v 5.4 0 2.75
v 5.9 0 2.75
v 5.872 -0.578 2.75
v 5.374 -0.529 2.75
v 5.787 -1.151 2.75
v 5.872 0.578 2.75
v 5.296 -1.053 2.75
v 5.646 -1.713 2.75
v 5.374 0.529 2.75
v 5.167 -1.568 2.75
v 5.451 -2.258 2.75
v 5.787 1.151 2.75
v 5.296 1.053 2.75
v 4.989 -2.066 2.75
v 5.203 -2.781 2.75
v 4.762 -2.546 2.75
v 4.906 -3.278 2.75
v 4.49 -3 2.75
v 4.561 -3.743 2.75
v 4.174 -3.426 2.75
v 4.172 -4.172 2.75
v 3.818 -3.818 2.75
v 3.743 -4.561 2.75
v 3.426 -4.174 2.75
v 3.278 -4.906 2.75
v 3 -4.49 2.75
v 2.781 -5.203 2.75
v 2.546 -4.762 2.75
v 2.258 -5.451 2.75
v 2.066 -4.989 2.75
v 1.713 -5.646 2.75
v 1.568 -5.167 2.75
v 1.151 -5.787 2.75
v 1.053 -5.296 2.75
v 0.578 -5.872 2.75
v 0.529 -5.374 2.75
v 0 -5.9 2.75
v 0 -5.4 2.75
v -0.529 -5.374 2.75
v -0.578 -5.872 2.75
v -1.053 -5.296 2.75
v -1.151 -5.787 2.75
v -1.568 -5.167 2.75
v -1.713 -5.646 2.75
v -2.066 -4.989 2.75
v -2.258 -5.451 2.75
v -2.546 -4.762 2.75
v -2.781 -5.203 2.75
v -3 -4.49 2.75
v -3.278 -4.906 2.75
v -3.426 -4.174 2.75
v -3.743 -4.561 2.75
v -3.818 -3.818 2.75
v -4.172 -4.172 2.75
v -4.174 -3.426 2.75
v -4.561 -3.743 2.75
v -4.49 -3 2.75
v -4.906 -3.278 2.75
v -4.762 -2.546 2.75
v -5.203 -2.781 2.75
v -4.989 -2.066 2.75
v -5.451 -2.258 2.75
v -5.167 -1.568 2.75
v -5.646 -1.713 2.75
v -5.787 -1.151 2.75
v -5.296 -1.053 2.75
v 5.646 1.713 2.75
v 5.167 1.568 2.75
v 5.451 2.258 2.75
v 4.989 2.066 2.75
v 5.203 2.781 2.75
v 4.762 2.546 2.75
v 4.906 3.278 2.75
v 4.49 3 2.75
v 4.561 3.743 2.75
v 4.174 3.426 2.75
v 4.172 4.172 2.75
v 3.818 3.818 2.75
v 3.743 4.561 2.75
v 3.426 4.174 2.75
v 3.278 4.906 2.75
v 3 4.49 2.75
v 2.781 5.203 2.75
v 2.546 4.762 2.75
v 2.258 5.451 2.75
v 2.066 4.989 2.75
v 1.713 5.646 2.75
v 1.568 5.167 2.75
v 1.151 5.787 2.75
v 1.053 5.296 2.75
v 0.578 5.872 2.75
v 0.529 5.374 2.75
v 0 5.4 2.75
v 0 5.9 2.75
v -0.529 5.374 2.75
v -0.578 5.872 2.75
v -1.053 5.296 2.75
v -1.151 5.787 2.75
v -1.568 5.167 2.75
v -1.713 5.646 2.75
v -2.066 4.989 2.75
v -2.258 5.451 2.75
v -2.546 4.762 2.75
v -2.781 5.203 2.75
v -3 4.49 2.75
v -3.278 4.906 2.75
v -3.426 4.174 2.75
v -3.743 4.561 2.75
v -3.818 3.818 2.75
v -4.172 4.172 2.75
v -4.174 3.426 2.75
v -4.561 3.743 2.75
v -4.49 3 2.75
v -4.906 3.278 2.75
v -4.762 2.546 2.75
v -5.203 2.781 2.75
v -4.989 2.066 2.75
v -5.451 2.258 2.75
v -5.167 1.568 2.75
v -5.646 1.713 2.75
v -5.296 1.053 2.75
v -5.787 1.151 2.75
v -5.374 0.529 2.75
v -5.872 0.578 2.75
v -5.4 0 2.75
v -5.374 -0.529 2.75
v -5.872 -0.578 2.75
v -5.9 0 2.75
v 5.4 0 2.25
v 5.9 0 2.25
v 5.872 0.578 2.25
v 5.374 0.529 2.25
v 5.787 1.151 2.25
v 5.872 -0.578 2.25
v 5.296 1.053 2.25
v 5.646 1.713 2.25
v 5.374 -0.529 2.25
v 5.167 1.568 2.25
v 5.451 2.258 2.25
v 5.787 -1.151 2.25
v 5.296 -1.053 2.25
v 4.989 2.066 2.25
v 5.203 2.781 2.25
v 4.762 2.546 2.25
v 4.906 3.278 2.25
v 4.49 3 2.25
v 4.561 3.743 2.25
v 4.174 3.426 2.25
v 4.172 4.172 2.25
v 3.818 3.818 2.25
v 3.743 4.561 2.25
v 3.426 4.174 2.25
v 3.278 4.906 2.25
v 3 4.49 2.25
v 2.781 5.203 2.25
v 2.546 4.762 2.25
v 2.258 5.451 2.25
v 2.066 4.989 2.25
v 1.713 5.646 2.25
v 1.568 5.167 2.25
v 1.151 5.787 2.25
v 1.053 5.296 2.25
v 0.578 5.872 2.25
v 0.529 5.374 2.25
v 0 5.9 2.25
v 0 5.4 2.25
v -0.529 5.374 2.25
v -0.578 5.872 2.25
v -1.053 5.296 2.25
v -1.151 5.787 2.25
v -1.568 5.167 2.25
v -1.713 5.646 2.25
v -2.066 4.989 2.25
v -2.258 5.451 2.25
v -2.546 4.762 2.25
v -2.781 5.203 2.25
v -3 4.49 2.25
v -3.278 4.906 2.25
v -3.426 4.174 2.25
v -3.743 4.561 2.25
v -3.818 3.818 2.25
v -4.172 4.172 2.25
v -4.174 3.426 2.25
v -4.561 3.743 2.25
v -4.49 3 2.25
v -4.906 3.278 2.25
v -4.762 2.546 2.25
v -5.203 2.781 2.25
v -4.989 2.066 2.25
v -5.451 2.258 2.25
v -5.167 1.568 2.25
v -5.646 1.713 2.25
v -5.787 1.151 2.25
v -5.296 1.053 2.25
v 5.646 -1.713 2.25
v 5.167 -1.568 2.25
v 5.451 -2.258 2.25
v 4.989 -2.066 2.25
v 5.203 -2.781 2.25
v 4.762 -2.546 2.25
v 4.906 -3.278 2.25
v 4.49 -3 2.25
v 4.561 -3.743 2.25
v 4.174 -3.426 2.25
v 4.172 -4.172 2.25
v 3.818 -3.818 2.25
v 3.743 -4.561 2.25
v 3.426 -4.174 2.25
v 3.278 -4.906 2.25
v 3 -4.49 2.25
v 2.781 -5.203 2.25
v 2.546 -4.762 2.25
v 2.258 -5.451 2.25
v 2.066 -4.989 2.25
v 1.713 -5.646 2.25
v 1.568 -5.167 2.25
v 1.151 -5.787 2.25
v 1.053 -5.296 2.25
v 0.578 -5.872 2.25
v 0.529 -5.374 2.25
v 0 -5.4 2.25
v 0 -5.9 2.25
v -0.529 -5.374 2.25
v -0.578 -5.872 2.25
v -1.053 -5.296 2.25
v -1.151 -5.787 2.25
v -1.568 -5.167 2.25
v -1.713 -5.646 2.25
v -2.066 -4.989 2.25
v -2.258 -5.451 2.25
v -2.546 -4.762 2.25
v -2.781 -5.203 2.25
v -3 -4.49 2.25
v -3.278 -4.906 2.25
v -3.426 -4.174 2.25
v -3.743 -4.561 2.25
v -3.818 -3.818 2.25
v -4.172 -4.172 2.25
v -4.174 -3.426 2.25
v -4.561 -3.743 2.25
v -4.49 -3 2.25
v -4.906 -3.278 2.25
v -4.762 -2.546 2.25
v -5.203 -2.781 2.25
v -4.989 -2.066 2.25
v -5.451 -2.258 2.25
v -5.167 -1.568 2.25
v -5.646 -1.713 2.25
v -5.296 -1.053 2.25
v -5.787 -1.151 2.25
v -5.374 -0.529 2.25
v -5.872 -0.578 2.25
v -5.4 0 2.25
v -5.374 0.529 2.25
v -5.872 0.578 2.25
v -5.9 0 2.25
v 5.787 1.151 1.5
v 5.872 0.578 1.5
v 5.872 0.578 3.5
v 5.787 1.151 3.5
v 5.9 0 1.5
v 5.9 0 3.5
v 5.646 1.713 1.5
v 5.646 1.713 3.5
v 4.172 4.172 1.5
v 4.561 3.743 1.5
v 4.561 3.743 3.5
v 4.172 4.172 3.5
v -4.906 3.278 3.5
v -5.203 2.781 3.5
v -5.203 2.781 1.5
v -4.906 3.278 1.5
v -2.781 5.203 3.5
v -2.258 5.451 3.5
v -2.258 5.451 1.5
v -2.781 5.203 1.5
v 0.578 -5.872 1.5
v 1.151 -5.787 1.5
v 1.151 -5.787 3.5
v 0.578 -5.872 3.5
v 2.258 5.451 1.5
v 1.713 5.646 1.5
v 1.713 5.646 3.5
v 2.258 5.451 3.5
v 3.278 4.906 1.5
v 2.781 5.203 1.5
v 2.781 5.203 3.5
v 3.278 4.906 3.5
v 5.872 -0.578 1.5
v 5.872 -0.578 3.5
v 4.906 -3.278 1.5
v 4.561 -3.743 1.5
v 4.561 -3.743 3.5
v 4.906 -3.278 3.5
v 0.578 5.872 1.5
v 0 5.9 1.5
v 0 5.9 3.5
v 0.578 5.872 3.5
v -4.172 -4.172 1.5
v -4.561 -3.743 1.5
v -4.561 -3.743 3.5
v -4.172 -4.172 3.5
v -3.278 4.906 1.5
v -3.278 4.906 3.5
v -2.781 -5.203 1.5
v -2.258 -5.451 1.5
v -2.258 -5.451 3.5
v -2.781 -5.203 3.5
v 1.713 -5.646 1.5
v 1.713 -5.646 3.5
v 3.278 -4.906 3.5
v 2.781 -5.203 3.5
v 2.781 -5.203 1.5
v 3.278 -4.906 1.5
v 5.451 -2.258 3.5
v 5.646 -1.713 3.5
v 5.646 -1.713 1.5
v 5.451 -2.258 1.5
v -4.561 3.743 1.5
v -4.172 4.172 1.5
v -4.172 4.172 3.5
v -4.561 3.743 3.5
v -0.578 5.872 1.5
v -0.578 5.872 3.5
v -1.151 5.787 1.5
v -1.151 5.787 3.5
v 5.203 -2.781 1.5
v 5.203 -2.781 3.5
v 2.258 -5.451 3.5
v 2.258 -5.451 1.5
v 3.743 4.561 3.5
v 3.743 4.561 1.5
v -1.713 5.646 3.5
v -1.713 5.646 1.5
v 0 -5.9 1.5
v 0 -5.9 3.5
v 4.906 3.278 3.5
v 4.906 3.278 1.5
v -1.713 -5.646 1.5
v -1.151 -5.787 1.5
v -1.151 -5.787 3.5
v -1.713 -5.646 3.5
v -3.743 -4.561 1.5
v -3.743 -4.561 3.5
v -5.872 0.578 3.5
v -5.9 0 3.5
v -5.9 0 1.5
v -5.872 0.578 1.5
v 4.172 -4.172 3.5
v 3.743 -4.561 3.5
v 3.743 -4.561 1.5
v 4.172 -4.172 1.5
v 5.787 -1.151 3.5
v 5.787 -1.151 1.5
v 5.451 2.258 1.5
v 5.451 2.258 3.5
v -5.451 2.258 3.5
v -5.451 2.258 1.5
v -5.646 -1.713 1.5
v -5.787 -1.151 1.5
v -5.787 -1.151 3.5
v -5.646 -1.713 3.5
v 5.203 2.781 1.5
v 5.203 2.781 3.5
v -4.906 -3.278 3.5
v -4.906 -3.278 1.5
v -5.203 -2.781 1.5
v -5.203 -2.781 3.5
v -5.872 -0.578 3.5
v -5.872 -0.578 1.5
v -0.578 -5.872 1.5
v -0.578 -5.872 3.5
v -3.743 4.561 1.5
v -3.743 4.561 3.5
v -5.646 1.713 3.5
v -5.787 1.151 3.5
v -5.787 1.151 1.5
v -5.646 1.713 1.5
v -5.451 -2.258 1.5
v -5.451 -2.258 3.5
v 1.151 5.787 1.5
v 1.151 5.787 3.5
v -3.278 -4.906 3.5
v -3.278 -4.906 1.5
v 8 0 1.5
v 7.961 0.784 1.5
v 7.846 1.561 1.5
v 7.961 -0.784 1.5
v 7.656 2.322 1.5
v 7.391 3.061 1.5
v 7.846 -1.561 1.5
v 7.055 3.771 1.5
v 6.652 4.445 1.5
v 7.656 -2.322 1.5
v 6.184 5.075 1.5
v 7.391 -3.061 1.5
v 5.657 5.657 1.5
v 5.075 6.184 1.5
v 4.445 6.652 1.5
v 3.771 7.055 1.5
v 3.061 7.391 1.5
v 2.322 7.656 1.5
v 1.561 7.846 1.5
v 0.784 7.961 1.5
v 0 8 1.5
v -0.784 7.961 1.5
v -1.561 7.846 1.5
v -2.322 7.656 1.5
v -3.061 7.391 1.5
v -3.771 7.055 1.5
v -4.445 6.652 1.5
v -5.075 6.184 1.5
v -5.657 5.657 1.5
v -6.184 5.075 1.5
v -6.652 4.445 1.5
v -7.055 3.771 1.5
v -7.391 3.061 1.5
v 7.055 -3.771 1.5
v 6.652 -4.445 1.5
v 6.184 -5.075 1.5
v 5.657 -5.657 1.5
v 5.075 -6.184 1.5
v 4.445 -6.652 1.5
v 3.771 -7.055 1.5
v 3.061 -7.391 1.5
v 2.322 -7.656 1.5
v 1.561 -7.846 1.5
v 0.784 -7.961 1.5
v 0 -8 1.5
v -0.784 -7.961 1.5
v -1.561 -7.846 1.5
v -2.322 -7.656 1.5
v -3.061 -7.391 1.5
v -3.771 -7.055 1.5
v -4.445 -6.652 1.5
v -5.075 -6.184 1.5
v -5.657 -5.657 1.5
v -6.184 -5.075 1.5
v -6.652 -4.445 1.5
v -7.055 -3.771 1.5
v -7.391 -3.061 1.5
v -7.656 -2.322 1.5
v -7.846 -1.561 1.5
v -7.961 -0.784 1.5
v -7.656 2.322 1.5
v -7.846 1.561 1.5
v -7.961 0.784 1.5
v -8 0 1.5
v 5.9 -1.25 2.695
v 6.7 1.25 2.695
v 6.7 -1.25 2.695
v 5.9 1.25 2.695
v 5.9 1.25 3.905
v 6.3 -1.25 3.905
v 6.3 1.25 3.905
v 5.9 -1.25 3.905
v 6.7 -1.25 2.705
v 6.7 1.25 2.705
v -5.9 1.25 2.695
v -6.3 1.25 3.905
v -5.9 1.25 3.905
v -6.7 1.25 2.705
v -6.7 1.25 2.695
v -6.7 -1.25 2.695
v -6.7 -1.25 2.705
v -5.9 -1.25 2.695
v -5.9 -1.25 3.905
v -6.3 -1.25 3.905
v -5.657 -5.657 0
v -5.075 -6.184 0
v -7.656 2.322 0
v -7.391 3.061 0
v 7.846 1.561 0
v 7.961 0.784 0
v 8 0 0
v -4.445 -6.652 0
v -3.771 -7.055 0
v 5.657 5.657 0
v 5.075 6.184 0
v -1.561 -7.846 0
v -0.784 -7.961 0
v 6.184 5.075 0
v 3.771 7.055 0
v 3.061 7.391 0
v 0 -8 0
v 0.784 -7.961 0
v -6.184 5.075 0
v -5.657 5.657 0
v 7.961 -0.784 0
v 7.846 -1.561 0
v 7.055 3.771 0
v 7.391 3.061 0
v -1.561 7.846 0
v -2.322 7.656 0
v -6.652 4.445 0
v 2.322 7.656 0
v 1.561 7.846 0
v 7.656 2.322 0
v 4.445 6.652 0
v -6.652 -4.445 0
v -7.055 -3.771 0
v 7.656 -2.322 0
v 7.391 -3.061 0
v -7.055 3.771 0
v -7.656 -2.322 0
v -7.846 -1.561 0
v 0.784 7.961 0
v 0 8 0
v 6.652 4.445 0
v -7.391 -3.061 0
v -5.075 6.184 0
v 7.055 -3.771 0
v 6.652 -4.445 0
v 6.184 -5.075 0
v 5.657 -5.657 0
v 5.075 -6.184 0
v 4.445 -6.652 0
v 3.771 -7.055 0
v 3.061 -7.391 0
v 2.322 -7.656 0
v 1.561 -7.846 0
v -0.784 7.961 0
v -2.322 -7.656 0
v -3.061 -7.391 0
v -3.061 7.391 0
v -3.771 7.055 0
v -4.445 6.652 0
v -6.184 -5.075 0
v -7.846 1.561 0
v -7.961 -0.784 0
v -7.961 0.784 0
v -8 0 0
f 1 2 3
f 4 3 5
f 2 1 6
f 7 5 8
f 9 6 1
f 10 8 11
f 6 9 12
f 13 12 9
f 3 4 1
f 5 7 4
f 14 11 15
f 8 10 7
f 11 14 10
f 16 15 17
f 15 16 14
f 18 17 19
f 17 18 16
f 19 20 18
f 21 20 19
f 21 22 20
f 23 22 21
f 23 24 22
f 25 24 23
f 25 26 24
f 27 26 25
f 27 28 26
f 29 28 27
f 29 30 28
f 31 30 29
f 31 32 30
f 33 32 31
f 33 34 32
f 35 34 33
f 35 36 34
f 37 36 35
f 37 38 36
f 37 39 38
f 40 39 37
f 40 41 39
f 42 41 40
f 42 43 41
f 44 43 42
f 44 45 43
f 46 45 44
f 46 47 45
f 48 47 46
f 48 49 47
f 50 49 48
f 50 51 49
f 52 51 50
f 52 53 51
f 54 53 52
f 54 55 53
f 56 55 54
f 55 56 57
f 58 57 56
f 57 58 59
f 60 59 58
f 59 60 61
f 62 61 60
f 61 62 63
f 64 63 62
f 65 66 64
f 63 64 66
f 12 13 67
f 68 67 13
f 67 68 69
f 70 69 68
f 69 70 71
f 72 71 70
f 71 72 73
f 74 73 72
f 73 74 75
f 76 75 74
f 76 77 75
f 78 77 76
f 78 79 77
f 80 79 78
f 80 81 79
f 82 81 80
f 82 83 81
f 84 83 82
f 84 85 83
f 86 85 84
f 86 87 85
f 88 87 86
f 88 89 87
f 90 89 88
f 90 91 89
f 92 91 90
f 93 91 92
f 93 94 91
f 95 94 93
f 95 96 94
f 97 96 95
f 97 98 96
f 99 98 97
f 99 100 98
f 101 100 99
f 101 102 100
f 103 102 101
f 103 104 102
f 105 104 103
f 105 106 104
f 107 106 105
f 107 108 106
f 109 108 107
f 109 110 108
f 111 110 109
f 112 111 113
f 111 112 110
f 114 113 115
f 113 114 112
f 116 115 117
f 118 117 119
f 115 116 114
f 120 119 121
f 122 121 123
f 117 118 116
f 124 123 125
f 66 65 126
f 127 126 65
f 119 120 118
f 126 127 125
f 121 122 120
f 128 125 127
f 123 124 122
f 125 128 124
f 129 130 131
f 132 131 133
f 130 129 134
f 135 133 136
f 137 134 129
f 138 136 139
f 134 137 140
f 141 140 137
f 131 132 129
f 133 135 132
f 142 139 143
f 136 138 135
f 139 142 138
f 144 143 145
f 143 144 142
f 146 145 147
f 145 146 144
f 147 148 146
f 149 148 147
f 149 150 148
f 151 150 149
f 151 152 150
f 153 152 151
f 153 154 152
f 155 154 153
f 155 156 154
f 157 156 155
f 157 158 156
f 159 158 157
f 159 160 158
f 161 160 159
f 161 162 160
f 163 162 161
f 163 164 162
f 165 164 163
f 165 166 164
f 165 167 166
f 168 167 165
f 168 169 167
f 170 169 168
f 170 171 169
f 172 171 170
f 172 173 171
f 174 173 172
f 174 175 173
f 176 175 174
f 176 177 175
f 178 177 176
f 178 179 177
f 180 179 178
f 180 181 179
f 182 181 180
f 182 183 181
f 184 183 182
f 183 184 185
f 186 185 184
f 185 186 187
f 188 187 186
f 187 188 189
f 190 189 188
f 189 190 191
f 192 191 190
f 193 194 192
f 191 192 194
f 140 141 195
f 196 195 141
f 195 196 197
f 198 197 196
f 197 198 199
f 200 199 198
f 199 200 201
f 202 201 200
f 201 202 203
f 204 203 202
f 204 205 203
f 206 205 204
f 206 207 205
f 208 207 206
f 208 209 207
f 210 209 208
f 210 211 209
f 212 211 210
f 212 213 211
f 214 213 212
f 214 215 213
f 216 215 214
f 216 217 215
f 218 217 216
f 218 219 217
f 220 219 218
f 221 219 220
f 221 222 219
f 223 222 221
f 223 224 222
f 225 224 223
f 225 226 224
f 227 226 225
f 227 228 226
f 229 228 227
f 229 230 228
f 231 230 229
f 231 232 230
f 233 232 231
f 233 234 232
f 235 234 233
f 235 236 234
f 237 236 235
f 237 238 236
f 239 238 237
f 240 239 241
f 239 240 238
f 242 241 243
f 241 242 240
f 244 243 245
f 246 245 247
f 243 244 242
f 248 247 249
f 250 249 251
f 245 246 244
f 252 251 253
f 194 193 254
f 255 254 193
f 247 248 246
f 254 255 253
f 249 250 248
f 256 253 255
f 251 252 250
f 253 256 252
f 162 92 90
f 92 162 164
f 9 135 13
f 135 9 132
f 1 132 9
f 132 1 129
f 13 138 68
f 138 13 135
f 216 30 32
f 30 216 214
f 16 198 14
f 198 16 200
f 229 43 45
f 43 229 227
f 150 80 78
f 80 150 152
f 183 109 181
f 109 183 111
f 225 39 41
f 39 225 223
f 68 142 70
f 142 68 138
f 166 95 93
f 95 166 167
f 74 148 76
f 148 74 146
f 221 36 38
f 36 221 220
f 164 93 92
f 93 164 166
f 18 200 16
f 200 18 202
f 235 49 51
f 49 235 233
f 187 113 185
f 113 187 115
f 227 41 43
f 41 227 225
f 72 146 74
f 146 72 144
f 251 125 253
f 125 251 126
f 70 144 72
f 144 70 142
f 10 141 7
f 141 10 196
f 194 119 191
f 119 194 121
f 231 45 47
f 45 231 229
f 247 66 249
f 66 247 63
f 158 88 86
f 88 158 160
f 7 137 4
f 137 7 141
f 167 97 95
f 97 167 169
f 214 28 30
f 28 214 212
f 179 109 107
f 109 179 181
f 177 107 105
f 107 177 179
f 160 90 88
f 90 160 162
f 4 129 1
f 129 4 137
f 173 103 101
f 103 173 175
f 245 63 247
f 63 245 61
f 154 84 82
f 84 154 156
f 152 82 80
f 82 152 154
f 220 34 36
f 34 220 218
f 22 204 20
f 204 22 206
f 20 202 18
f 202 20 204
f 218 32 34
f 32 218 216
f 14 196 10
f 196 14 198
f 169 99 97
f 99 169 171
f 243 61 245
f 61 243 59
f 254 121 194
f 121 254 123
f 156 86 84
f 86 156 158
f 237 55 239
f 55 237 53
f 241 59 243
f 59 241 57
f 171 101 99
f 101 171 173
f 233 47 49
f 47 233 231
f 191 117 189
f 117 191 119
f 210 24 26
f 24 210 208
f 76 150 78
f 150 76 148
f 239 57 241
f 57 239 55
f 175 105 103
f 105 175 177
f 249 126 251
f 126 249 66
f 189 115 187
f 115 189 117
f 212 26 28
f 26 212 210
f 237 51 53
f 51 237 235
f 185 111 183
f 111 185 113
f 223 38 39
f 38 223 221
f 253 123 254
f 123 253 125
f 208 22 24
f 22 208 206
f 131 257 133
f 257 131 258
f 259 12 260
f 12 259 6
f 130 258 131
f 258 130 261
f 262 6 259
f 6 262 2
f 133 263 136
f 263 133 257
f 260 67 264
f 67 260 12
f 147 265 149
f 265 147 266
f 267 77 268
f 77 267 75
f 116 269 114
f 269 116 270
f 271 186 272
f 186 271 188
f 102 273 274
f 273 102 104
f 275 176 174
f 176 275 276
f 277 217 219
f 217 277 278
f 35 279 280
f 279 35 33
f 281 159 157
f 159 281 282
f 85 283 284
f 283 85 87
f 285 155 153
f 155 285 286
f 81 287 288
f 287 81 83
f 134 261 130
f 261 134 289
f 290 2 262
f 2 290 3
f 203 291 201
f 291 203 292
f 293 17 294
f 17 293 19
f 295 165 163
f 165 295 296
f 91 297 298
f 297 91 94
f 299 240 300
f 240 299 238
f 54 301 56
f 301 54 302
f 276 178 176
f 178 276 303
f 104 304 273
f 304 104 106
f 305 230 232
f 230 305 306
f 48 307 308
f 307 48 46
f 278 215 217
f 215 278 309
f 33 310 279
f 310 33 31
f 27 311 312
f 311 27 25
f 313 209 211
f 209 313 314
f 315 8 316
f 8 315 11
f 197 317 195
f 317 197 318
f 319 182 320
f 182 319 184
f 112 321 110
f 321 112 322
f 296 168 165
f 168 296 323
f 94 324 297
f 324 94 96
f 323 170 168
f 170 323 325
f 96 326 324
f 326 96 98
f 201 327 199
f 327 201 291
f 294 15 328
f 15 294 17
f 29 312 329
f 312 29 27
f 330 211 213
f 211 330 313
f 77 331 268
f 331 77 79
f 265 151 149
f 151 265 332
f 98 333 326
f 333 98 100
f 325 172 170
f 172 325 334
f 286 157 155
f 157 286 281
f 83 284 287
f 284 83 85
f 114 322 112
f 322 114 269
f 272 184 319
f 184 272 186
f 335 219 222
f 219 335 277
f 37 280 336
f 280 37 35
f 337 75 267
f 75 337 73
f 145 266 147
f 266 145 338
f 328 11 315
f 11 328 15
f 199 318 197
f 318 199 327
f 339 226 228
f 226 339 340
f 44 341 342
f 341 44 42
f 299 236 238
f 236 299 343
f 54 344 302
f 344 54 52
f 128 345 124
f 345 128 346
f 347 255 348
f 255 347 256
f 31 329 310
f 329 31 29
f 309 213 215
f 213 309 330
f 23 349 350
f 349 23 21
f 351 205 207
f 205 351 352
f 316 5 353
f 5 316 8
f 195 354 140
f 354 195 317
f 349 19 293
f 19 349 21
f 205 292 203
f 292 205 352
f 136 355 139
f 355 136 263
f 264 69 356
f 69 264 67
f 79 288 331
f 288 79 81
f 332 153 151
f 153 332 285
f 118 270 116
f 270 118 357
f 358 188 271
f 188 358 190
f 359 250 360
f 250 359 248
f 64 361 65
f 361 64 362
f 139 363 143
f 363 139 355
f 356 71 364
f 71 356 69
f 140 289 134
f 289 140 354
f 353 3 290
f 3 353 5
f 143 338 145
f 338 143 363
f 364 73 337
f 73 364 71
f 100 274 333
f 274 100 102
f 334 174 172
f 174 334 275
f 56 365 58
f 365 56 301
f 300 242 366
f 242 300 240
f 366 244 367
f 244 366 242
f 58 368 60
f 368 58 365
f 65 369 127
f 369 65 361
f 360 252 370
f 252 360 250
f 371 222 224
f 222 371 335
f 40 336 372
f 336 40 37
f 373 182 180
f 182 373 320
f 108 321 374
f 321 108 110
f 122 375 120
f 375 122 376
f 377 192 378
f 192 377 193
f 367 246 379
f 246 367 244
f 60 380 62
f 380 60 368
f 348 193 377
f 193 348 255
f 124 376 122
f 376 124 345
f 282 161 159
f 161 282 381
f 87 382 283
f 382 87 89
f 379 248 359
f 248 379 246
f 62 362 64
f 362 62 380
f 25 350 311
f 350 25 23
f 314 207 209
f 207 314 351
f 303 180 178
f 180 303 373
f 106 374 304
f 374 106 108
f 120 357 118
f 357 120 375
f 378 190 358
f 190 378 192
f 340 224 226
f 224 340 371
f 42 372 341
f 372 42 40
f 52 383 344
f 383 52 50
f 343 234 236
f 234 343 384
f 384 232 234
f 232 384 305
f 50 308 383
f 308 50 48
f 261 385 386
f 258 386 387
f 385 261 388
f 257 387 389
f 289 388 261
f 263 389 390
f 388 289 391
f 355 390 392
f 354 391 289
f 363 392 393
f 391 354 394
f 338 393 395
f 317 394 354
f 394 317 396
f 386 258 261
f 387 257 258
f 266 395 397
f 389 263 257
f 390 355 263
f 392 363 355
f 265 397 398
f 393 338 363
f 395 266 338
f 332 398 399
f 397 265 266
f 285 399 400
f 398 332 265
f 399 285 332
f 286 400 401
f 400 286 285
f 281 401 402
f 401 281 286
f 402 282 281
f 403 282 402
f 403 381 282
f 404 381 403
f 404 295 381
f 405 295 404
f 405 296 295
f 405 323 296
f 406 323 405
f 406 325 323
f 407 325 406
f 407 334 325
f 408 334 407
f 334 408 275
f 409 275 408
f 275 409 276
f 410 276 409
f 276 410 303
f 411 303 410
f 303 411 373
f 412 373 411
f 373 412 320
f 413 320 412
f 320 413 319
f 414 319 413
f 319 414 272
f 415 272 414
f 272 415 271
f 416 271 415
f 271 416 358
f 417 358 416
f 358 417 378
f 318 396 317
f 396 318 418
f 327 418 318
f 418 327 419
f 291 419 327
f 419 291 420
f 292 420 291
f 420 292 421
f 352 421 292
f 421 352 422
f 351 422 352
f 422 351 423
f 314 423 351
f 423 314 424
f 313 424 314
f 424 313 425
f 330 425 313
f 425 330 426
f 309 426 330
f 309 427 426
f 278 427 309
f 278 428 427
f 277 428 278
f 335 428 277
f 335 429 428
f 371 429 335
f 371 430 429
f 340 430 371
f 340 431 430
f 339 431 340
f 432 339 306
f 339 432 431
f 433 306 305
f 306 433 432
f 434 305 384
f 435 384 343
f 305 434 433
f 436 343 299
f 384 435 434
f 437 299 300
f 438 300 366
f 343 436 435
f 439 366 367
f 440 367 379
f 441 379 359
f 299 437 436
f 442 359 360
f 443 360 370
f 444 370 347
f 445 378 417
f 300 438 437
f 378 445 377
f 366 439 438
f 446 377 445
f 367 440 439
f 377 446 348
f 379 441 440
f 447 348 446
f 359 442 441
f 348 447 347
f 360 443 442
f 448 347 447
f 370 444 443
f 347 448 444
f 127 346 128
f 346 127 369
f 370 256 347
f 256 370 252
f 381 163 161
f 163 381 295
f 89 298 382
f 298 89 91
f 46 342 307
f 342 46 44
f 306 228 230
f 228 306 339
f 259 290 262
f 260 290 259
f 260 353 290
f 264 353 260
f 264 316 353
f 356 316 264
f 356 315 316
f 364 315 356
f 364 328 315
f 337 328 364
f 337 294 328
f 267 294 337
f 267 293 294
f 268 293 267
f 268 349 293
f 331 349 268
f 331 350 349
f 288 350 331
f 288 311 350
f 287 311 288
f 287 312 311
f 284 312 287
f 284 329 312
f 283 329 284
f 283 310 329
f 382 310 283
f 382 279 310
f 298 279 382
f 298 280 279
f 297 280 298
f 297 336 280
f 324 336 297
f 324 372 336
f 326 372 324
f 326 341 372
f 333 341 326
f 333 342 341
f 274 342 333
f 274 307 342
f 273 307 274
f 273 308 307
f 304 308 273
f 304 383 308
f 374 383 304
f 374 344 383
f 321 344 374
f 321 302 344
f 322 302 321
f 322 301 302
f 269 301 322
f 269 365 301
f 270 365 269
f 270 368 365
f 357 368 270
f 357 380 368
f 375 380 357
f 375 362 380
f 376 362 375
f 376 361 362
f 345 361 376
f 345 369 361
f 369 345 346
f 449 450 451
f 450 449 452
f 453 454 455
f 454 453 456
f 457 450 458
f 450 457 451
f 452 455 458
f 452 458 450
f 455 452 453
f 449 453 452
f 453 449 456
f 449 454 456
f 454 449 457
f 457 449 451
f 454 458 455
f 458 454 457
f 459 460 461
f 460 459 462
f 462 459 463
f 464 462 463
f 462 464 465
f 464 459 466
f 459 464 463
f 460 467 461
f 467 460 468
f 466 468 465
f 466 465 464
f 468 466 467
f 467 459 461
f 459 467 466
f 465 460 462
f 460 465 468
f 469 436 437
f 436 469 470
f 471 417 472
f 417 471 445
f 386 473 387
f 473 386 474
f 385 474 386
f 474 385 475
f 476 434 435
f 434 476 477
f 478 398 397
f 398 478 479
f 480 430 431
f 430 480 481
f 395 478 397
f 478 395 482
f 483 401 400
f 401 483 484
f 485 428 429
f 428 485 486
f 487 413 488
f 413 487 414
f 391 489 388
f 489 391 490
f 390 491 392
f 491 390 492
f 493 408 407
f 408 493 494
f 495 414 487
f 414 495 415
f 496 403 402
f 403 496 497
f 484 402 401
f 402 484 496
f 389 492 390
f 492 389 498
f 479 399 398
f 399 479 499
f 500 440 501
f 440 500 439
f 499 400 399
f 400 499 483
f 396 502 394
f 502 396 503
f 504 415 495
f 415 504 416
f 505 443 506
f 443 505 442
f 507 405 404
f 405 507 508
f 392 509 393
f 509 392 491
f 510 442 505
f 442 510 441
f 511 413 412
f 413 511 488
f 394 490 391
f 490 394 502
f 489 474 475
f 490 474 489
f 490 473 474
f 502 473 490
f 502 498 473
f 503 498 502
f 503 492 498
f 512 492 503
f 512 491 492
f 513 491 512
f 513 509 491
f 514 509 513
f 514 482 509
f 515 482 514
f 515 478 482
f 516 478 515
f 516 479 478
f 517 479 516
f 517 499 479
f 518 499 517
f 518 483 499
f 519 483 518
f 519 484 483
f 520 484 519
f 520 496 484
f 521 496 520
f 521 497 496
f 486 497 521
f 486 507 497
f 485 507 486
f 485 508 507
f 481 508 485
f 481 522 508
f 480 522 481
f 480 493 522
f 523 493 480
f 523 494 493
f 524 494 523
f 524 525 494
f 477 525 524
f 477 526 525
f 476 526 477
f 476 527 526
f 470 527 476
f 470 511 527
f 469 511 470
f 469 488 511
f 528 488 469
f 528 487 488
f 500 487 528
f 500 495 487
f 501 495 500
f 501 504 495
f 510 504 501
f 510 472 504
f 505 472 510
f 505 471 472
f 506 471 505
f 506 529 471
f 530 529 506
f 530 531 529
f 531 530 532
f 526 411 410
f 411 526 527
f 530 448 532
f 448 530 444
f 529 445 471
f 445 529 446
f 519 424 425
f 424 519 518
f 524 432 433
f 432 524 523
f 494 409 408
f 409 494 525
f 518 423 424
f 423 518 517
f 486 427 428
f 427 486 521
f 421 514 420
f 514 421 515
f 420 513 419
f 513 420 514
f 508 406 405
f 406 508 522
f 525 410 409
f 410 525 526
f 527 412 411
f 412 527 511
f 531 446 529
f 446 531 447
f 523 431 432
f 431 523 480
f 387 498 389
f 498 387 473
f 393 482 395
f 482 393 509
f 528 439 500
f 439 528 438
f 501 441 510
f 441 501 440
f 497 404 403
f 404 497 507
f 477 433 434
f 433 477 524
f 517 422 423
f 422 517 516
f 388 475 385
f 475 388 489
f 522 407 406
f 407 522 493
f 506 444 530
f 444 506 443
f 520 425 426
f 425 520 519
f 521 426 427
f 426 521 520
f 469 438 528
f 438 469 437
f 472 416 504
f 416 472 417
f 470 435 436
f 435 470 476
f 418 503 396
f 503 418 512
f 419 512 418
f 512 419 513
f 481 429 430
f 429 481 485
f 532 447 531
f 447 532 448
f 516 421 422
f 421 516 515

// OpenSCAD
// file: parameters.scad
// =============================================================================
// The Void — Parametric Constants (Golden Ratio Cloche)
// =============================================================================
// Every proportion derived from φ = 1.618 and the 8" dome diameter.
// The same ratio found in nautilus shells, sunflower spirals,
// and the mycelium branching patterns this dome nurtures.
//
// Design lineage: D → R → arch → straight (×φ) → base (÷φ²)
// =============================================================================

// === GLOBAL ===
quality = "preview";  // "preview" or "render"
$fn = (quality == "render") ? 128 : 64;

phi = 1.6180339887;          // Golden ratio
golden_angle = 137.507764;   // 360° / φ²
fdm_tolerance = 0.2;         // mm — FDM print tolerance
epsilon = 0.01;              // mm — CSG overlap

// === OVERALL DIMENSIONS ===
D = 203;                     // 8" dome outer diameter (product spec, fixed)
R = D / 2;                   // 101.5mm
wall = 2.5;                  // mm — shell thickness

// === DOME SHELL ===
// Derivation chain: R → arch_height → straight_height (×φ) → dome_height
arch_height = R;                              // 101.5mm — semicircular cap
straight_height = arch_height * phi;          // 164.2mm — φ × arch
dome_height = straight_height + arch_height;  // 265.7mm — total dome

// === BASE HOUSING ===
// Derivation chain: R → base_h (÷φ²), wall → base_overhang (×φ)
base_h = R / (phi * phi);      // 38.8mm — R/φ²
base_overhang = wall * phi;     // 4.0mm — wall×φ
base_floor = 3;                 // mm — floor thickness
base_chamfer = 2;               // mm — bottom edge chamfer
r_outer = R + base_overhang;    // 105.5mm — total base radius

// === PLATFORM ===
platform_diameter = 140;        // mm — growing platform
platform_rim_height = 6;        // mm — rim around edge
platform_z = base_floor + 2;    // mm — clearance above base floor

// === VOID CORE COMPONENTS ===
// Port from Phase 10 — internal electronics layout unchanged by dome shape

// Raspberry Pi Zero W 2
pi_zero_width  = 30;   // mm
pi_zero_length = 65;   // mm

// 30mm axial fan
fan_diameter = 30;      // mm
fan_depth    = 10;      // mm

// BME280 sensor breakout
bme280_width  = 13;    // mm
bme280_length = 11;    // mm

// Humidifier reservoir
humidifier_reservoir_diameter = 40;  // mm
humidifier_reservoir_depth    = 25;  // mm

// Servo
servo_width  = 12;     // mm
servo_length = 23;     // mm

// Cable channel
cable_channel_depth = 2;  // mm — preserves floor integrity

// === VENT SYSTEM ===
vent_hole_diameter = 12;      // mm — exhaust vent holes
vent_cap_flange = 16;         // mm — cap outer flange
vent_cap_insert = 11.8;       // mm — 12 - 2×fdm_tolerance
vent_cap_snap_protrusion = 1; // mm

// === EASTER EGG ENGRAVING ===
etch_depth = 0.8;       // mm
line_width = 1.2;        // mm
max_radius = R - 8;      // mm — pattern boundary

// =============================================================================
// PROPORTION SUMMARY
// =============================================================================
// Dome diameter:     203.0mm (8.0")
// Straight walls:    164.2mm (φ × arch)
// Arch cap:          101.5mm (R)
// Total dome:        265.7mm (10.5")
// Base height:        38.8mm (R/φ²)
// Base overhang:       4.0mm (wall×φ)
// Total height:      304.5mm (12.0")
//
// Golden ratios embedded:
//   straight / arch  = φ     (1.618)
//   base / arch      = 1/φ²  (0.382)
//   overhang / wall  = φ     (1.618)
// =============================================================================
// main file
// =============================================================================
// The Void — Snap-In Vent Cap
// =============================================================================
// Removable caps for the 4 exhaust vent holes on the cloche dome wall.
// Snap-fit design: tapered tabs for tool-free insertion/removal.
//
// Features:
//   - Outer flange (16mm) covers vent hole from outside
//   - Insert cylinder (11.8mm) fits inside vent hole
//   - 2 opposing snap tabs with hull()-based taper for smooth insertion
//   - Internal mesh holder groove for optional filter media
//
// Public API:  vent_cap(), vent_cap_batch()
// =============================================================================

include <parameters.scad>

// === CAP DIMENSIONS ===
flange_r  = vent_cap_flange / 2;       // 8mm — outer flange radius
flange_h  = 1.5;                        // mm — flange thickness
insert_r  = vent_cap_insert / 2;        // 5.9mm — insert radius (12 - 2*0.1)
insert_h  = wall - 0.5;                 // 2.0mm — insert length (wall minus clearance)

// === SNAP TAB DIMENSIONS ===
tab_protrusion = 0.8;                   // mm — max outward protrusion
tab_leading    = 0.4;                   // mm — thin leading edge for taper
tab_width      = 2.5;                   // mm — tab width (circumferential)
tab_height     = 1.2;                   // mm — tab height (axial)

// === MESH GROOVE ===
groove_depth = 0.5;                     // mm — groove into insert wall
groove_width = 0.5;                     // mm — groove axial width

// === SINGLE VENT CAP ===
// Oriented flange-down for printing (flange on build plate).
module vent_cap() {
    // --- Outer flange ---
    cylinder(h = flange_h, r = flange_r);

    // --- Insert cylinder with mesh groove ---
    translate([0, 0, flange_h])
        difference() {
            cylinder(h = insert_h, r = insert_r);
            // Mesh holder groove at insert midpoint
            translate([0, 0, (insert_h - groove_width) / 2])
                difference() {
                    cylinder(h = groove_width, r = insert_r + epsilon);
                    cylinder(h = groove_width, r = insert_r - groove_depth);
                }
        }

    // --- Snap tabs (2, opposing at 0 and 180 degrees) ---
    for (a = [0, 180]) {
        rotate([0, 0, a])
            translate([0, 0, flange_h + insert_h * 0.6])
                _snap_tab();
    }
}

// === PRIVATE: Single snap tab ===
// Tapered ramp using hull() between thin leading edge and full protrusion.
// Leading edge is thinner for easy insertion; full protrusion locks in place.
module _snap_tab() {
    hull() {
        // Leading edge (thin) — at top of tab
        translate([insert_r + tab_leading/2, 0, tab_height])
            cube([tab_leading, tab_width, epsilon], center = true);
        // Full protrusion (thick) — at bottom of tab
        translate([insert_r + tab_protrusion/2, 0, 0])
            cube([tab_protrusion, tab_width, epsilon], center = true);
    }
}

// === BATCH LAYOUT ===
// 2x2 grid with 25mm spacing for printing all 4 caps at once.
// Caps oriented flange-down on print bed.
module vent_cap_batch() {
    spacing = 25;
    for (x = [0, 1])
        for (y = [0, 1])
            translate([x * spacing - spacing/2, y * spacing - spacing/2, 0])
                vent_cap();
}

// === Standalone preview ===
// Single cap preview
vent_cap();
// Batch layout for printing (uncomment to preview)
// translate([0, 60, 0]) vent_cap_batch();
